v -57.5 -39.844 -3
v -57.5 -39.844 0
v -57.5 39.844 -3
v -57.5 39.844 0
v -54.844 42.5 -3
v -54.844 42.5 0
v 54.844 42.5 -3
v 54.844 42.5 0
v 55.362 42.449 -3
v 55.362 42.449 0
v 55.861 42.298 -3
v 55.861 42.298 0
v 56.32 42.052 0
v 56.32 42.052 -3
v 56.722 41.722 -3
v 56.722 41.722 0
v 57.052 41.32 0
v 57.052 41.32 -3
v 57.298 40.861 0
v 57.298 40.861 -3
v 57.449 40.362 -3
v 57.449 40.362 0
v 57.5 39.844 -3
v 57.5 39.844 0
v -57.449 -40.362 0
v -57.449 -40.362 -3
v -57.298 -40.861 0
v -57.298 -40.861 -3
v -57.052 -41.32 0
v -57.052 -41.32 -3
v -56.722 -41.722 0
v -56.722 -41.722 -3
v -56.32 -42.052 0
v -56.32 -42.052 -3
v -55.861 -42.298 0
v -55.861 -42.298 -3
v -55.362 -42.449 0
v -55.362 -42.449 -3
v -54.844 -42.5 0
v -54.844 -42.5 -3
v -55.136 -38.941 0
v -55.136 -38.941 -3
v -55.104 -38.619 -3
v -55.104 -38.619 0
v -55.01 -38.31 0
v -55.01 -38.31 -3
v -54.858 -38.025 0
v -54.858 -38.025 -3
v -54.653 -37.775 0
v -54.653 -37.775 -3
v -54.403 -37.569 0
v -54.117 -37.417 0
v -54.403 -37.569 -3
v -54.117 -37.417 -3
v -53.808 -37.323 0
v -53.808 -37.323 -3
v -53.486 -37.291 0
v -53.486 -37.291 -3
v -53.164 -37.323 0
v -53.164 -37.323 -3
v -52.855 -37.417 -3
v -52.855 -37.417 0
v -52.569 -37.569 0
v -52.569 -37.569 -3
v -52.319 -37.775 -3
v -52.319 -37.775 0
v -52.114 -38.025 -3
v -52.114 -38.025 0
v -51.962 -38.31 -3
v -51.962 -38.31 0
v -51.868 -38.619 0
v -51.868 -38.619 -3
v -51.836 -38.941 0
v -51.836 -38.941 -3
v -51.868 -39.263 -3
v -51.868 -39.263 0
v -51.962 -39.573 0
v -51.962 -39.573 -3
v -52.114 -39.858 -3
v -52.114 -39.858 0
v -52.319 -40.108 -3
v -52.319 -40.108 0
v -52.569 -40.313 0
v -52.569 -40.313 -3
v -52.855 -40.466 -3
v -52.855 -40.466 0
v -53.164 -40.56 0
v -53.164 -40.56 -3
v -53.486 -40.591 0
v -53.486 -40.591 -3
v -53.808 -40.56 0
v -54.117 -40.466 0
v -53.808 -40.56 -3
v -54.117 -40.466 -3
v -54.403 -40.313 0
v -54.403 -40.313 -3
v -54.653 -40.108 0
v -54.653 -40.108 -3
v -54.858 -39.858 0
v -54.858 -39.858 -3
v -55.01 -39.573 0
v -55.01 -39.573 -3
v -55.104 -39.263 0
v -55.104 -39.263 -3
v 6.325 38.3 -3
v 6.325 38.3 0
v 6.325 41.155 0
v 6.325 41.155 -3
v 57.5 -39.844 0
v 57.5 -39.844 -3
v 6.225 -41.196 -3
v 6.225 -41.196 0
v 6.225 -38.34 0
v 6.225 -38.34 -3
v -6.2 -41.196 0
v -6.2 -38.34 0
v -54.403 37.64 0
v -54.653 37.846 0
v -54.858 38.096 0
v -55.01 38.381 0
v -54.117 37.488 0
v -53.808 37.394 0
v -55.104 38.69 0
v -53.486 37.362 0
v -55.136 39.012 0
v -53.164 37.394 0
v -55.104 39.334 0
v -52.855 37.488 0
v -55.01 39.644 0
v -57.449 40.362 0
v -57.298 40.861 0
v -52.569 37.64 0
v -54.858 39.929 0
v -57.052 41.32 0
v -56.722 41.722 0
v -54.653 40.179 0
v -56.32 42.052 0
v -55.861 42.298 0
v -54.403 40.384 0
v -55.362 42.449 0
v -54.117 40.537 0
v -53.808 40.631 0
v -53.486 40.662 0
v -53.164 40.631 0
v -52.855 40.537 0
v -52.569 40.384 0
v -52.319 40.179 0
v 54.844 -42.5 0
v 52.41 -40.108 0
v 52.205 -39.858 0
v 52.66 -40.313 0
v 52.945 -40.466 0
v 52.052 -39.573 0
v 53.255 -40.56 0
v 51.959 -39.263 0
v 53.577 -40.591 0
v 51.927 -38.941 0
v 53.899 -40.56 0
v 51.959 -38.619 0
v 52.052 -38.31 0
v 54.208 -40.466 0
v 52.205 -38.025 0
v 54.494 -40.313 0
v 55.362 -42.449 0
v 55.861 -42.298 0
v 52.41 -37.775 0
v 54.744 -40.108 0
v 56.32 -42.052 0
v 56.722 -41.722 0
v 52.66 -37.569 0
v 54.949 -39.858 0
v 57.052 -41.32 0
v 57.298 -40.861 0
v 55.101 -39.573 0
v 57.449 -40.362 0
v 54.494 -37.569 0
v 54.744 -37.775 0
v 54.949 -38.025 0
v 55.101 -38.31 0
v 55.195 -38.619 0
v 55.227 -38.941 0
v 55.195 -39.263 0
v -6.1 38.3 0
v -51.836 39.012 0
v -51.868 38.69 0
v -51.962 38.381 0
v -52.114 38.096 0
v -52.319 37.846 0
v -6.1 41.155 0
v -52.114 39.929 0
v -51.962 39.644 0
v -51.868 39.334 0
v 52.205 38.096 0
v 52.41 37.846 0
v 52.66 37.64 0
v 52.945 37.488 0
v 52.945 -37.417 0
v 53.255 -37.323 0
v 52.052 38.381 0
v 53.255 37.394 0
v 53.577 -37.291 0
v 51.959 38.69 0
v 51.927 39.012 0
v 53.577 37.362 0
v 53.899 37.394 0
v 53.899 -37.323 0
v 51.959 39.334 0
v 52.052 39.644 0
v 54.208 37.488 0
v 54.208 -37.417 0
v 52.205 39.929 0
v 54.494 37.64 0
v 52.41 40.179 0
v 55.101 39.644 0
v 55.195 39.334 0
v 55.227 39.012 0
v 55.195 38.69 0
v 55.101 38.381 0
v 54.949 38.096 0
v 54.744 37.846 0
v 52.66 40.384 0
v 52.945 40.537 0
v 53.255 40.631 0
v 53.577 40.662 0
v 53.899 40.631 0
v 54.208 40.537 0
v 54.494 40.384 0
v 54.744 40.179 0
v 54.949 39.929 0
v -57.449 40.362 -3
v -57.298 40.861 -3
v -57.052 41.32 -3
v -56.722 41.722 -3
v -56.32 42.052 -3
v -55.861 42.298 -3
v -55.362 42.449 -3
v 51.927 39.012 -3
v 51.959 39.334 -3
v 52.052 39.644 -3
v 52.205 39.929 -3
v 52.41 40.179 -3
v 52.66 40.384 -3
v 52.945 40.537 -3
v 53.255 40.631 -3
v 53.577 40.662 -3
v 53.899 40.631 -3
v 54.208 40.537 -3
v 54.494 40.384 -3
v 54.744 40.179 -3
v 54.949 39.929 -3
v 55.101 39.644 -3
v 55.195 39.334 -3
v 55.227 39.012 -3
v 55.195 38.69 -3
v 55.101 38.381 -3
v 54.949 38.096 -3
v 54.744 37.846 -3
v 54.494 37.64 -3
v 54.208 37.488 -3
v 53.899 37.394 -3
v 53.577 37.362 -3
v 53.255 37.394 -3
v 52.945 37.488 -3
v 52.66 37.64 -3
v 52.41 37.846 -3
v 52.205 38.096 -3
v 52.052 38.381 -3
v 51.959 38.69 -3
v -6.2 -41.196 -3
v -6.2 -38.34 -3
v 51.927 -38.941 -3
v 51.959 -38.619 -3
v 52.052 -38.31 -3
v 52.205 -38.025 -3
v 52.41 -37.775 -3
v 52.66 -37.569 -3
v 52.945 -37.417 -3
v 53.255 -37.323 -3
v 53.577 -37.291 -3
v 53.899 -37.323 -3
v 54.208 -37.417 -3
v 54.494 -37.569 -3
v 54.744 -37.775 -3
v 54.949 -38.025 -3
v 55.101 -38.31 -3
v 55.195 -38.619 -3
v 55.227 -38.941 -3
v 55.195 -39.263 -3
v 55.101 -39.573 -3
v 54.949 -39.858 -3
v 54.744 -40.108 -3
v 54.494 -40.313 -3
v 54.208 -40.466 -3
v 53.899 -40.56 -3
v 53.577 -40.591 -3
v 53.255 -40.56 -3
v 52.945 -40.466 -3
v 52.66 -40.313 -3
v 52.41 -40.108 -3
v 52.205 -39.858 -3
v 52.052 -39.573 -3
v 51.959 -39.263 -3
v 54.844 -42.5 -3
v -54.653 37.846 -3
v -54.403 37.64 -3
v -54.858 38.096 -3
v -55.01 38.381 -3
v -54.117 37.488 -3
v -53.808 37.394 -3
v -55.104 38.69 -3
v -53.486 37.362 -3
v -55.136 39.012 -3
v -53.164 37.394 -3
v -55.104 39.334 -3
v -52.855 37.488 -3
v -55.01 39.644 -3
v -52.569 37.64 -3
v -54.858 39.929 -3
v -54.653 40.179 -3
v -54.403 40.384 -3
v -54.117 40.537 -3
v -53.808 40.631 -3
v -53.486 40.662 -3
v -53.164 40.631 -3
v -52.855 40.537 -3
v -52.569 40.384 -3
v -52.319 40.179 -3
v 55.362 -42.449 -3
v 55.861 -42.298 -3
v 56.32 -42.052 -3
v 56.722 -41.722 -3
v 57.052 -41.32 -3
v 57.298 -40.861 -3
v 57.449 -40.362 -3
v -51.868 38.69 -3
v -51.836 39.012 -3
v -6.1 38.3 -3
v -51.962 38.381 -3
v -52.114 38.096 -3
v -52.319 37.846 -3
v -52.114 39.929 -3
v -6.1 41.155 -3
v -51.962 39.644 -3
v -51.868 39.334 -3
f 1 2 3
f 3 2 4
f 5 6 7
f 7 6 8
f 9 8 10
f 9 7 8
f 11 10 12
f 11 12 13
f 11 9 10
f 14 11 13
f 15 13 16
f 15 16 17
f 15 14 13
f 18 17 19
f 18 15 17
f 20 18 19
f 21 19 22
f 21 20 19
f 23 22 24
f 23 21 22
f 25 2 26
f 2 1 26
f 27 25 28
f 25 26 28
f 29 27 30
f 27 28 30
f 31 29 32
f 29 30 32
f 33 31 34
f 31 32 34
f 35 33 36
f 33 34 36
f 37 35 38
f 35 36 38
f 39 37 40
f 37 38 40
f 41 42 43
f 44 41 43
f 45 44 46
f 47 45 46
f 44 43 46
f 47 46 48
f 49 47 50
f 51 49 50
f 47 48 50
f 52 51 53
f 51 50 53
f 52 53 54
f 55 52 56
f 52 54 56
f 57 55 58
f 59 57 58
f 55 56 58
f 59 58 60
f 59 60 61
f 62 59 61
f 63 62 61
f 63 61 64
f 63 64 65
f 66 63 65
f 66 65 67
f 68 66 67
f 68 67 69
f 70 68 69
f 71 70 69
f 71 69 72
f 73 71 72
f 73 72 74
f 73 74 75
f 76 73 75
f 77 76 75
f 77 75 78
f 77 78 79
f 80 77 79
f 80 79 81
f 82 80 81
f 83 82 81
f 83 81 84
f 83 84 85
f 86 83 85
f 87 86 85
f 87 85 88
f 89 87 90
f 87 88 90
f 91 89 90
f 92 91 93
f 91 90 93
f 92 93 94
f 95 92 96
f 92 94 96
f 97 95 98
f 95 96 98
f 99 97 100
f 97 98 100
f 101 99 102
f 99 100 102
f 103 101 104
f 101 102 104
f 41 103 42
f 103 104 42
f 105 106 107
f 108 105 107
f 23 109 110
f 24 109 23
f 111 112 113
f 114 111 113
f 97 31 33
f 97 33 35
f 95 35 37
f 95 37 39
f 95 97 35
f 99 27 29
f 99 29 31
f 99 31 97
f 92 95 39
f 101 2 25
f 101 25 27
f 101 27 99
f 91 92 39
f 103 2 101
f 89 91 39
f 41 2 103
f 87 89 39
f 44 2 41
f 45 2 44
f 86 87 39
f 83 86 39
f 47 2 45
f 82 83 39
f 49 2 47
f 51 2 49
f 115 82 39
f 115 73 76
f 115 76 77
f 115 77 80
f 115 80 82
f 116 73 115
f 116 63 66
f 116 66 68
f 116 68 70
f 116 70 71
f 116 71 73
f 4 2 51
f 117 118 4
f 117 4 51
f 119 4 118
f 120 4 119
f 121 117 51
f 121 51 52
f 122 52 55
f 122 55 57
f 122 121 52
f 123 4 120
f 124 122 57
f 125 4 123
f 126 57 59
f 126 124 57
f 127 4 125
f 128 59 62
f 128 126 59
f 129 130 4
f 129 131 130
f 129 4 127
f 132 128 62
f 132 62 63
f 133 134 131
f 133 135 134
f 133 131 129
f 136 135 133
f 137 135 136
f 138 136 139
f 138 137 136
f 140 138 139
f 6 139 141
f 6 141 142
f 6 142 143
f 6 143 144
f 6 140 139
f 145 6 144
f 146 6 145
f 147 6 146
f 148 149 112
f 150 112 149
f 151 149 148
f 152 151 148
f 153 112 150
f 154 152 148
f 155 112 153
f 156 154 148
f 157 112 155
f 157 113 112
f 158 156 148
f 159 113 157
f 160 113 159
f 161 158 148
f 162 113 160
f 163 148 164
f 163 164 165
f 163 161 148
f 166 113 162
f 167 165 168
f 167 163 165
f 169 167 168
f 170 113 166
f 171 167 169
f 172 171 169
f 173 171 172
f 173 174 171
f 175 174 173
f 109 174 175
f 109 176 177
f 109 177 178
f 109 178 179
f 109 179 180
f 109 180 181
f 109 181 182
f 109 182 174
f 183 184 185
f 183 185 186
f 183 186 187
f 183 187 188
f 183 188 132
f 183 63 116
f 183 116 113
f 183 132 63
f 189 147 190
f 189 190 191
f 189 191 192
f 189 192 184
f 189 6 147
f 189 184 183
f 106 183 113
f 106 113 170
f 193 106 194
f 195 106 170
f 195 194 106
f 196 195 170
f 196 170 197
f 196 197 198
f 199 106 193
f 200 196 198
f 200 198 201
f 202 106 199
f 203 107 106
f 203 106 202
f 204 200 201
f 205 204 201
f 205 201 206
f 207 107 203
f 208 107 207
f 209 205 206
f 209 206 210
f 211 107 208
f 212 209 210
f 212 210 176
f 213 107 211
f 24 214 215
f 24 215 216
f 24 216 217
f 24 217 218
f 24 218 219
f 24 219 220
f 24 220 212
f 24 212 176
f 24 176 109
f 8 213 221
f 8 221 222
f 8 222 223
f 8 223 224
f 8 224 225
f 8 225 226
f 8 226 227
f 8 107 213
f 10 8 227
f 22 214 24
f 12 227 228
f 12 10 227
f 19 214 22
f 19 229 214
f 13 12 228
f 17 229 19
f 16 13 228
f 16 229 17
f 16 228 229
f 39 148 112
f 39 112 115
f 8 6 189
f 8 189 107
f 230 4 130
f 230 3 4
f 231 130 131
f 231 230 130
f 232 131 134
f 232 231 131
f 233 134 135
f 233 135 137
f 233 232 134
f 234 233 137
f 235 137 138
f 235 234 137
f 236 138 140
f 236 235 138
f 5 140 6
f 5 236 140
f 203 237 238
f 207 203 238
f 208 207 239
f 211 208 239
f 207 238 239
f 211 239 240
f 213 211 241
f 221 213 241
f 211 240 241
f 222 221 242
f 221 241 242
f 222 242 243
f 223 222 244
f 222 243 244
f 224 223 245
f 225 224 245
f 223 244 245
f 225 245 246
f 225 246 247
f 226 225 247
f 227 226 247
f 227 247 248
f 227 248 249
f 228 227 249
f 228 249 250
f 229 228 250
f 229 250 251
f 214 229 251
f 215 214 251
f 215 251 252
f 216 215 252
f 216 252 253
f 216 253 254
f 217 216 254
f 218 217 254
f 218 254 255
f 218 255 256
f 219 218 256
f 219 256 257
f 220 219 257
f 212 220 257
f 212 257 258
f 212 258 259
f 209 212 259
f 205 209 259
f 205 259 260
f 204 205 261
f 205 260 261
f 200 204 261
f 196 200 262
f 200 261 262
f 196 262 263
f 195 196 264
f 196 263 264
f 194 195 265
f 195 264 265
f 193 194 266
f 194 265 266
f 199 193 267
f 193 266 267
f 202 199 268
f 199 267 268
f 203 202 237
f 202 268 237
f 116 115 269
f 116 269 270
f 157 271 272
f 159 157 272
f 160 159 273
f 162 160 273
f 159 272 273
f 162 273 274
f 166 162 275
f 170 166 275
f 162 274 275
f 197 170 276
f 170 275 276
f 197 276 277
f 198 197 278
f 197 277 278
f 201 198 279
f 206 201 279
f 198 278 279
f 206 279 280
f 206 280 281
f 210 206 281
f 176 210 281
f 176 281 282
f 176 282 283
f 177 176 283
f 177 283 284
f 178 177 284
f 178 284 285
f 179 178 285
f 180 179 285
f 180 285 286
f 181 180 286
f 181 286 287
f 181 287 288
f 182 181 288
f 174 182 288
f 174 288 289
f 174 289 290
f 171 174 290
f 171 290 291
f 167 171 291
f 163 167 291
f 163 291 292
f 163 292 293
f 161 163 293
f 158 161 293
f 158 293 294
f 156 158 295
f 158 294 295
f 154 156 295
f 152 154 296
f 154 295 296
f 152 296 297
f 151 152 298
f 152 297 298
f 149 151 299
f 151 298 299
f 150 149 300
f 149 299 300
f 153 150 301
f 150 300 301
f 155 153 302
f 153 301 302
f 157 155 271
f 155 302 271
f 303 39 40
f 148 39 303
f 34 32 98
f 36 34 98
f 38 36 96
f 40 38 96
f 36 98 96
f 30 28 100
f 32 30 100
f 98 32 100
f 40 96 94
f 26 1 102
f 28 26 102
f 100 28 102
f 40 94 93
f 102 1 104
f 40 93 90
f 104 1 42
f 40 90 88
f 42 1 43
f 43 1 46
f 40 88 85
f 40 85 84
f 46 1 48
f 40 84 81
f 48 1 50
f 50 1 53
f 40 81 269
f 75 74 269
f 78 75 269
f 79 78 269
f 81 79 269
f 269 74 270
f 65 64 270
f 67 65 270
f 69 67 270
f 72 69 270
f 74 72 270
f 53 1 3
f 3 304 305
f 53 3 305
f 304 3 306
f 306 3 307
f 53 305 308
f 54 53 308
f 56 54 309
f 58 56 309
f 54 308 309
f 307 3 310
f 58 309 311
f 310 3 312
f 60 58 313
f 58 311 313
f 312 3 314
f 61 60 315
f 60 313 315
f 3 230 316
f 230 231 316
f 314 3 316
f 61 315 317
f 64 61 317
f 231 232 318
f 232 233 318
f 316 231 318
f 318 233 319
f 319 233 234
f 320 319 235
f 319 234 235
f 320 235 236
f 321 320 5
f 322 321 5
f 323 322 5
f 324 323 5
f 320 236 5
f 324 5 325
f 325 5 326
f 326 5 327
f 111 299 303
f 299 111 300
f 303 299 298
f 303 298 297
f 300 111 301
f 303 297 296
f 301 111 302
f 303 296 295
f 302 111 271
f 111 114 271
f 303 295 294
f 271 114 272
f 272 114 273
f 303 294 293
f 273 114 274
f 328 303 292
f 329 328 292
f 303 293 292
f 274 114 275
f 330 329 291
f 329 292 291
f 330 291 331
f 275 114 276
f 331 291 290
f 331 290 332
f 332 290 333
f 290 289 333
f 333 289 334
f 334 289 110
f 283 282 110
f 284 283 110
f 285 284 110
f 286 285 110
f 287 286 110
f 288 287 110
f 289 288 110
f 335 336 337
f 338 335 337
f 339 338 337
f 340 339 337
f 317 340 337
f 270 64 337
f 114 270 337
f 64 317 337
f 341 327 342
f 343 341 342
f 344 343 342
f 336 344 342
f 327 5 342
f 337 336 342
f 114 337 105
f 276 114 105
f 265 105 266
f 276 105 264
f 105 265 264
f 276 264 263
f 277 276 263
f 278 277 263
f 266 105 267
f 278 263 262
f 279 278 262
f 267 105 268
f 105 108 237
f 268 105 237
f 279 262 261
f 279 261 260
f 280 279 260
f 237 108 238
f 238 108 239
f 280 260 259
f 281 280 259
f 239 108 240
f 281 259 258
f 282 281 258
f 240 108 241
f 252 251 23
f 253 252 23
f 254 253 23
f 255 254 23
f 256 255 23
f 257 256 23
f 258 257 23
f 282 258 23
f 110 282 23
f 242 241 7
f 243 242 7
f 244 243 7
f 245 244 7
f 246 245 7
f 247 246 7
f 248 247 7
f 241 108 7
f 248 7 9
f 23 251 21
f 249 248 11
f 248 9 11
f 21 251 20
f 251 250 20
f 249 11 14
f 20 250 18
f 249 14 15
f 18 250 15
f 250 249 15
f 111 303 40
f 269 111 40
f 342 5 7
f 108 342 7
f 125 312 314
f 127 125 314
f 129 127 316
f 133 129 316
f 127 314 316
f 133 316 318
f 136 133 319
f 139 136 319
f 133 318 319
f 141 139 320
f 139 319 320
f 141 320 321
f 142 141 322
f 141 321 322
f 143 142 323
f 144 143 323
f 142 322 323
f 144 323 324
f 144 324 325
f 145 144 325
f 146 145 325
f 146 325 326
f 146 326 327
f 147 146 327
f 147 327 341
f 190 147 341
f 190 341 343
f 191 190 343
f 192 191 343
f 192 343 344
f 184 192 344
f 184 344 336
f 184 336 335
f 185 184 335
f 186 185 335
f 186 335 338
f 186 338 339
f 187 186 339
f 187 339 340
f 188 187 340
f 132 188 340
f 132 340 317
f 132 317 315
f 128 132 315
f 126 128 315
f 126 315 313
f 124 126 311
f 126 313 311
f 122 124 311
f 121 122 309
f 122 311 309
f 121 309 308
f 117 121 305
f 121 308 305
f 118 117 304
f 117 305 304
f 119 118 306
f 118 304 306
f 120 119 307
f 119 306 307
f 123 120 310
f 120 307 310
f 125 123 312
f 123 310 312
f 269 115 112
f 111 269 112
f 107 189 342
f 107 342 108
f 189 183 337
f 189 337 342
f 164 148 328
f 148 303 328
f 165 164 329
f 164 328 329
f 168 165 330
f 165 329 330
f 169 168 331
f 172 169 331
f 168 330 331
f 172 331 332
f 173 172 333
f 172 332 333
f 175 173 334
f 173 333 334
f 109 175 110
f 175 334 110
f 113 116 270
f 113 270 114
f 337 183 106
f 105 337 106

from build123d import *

# Parameters (mm, degrees)
F0_W     = 115
F0_H     = 85
F0_W_2   = 12.42488157
F0_H_2   = 2.8554350138
F1_DEPTH = 3
F2_R     = 2.6556349186
F3_D     = 3.3
F3_DEPTH = 13.5
F3_TIP   = 0.9914200214


with BuildPart() as f1:
    # F0 (on Top) → F1 (new body)
    with BuildSketch(Plane.XY):
        Rectangle(F0_W, F0_H)
        with Locations((0.012440607, -39.7679619491)):
            Rectangle(F0_W_2, F0_H_2, mode=Mode.SUBTRACT)
        with Locations((0.1124413684, 39.7277288139)):
            Rectangle(F0_W_2, F0_H_2, mode=Mode.SUBTRACT)
    extrude(amount=-F1_DEPTH)

    # F2
    f2_edges = [f1.edges().sort_by_distance(p)[0] for p in [
        (57.5, -42.5, -1.5),
        (57.5, 42.5, -1.5),
        (-57.5, -42.5, -1.5),
        (-57.5, 42.5, -1.5),
    ]]
    fillet(f2_edges, radius=F2_R)

    # F3
    with Locations(Plane.XY):
        with Locations((-53.4860491753, -38.9412779514), (-53.4860491753, 39.0123836696), (53.5768903792, -38.9412779514), (53.5768903792, 39.0123836696)):
            Hole(F3_D / 2, depth=F3_DEPTH)
            with Locations((0, 0, -(F3_DEPTH + F3_TIP / 2))):  # 118° drill point
                Cone(0, F3_D / 2, F3_TIP, mode=Mode.SUBTRACT)


solid = f1.part
